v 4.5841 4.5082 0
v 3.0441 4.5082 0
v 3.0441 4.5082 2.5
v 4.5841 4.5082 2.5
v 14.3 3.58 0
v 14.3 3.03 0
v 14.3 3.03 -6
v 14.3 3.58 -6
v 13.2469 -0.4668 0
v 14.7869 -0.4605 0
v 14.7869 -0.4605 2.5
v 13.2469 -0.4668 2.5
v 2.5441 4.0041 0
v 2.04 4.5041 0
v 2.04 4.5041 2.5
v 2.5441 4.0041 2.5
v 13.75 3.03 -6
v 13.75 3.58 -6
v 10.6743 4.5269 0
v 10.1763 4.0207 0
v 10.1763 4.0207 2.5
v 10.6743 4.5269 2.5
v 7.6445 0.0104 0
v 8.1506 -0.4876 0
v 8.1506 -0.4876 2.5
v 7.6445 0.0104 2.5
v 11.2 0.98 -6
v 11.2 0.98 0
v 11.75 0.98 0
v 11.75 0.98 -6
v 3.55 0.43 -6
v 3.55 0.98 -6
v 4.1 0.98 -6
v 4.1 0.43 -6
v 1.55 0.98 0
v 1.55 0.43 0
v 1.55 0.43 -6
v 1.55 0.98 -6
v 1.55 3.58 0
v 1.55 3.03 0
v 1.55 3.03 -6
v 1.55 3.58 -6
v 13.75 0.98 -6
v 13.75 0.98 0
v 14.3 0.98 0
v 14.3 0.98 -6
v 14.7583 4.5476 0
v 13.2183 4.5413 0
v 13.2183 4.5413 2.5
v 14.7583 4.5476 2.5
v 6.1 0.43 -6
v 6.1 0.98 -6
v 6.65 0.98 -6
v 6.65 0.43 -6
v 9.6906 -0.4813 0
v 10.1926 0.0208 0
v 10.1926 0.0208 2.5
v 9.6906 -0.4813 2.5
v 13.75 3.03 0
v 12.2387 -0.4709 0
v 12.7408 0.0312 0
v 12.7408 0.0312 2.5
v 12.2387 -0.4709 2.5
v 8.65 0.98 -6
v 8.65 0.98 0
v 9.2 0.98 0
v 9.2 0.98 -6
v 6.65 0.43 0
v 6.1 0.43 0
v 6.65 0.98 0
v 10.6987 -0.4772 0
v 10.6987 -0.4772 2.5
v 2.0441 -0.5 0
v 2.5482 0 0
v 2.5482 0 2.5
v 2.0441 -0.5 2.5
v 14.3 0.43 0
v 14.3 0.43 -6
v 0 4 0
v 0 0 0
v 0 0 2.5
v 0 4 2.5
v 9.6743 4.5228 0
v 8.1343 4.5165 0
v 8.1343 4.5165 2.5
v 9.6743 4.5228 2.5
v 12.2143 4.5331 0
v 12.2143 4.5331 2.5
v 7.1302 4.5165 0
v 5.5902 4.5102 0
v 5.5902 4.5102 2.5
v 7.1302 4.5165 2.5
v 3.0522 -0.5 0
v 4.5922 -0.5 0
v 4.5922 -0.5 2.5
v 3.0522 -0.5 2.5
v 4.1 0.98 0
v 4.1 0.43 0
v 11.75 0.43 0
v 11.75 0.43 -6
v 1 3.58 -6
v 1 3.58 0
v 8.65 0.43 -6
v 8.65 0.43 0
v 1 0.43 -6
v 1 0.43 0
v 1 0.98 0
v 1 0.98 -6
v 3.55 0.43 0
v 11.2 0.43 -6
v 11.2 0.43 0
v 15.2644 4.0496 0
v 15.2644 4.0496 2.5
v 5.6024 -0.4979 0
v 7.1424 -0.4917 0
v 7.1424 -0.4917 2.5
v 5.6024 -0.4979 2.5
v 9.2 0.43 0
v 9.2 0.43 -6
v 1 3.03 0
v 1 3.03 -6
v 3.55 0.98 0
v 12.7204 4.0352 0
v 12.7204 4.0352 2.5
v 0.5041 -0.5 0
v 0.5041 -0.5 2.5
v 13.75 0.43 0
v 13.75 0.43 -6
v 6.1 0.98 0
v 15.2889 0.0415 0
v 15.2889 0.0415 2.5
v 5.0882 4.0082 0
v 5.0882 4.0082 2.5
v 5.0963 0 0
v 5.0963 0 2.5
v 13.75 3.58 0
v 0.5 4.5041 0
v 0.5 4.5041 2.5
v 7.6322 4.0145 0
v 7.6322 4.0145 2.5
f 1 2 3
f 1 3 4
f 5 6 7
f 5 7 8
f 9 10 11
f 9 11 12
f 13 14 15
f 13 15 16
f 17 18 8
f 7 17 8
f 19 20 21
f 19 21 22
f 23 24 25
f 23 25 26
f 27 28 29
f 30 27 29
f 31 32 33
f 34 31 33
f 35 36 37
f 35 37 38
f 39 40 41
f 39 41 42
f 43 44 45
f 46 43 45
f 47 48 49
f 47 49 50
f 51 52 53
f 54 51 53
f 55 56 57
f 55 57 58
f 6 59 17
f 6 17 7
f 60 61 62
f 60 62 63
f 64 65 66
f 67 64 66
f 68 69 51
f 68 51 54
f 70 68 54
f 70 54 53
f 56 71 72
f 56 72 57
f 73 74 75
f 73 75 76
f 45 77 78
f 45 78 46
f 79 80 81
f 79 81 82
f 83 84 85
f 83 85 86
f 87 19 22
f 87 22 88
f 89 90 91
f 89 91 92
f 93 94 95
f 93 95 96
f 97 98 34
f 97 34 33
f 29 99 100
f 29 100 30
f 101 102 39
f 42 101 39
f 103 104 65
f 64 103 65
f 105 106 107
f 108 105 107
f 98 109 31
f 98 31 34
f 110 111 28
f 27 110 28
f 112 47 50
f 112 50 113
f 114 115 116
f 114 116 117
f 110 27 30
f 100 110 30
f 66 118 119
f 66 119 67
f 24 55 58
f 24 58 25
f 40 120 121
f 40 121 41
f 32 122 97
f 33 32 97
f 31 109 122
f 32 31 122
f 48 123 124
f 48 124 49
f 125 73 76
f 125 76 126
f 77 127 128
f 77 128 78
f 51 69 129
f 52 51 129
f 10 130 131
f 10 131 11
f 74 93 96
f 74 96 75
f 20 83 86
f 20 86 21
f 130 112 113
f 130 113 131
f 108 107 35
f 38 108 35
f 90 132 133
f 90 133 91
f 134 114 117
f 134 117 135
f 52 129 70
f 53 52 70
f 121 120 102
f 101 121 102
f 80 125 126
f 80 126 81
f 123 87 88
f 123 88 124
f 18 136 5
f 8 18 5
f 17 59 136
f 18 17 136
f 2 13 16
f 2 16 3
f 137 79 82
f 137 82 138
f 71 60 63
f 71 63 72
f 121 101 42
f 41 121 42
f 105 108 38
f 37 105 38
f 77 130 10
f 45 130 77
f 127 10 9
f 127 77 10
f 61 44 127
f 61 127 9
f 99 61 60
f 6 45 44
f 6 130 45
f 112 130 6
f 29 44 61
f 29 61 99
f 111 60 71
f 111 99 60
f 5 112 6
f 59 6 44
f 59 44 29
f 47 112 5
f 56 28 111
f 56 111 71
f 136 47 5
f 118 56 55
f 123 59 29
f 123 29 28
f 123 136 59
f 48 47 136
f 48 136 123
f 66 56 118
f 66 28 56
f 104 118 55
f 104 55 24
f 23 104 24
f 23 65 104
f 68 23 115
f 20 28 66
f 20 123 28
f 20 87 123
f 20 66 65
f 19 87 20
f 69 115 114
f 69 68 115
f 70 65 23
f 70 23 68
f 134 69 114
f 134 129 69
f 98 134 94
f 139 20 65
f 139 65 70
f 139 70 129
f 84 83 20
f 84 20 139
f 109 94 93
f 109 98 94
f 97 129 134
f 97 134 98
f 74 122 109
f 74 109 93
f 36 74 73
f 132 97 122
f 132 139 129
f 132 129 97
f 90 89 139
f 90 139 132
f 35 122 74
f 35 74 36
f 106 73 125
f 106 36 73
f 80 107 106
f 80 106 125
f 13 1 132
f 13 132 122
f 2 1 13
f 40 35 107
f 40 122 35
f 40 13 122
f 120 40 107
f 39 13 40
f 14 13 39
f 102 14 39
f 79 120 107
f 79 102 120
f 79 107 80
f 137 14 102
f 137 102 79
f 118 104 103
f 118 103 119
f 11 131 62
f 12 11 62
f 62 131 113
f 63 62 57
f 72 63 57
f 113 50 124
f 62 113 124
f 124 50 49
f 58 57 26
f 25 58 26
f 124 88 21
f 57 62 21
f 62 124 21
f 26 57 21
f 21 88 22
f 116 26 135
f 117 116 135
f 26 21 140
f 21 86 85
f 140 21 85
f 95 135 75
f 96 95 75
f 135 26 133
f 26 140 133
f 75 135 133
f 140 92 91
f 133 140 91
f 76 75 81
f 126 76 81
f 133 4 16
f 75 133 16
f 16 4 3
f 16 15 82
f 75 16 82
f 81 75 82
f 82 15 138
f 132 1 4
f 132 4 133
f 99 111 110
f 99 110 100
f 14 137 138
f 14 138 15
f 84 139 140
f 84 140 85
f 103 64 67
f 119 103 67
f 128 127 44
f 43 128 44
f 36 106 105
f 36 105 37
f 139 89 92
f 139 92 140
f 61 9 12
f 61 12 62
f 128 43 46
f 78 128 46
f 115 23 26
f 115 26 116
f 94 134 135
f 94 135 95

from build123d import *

# Parameters (mm, degrees)
BOSS_EXTRUDE1_DEPTH = 2.5
SKETCH2_W           = 0.55
SKETCH2_H           = 0.55
BOSS_EXTRUDE2_DEPTH = 6


with BuildPart() as part:
    # Sketch1 → Boss-Extrude1 (new body)
    with BuildSketch(Plane.XY):
        Polygon((0, 0), (0, 4), (0.5, 4.504083326), (2.04, 4.504083326), (2.544083326, 4.004083326), (3.044083326, 4.508166653), (4.584083326, 4.508166653), (5.088166653, 4.008166653), (5.590208299, 4.510216636), (7.130195513, 4.51649212), (7.632245496, 4.014450474), (8.134287142, 4.516500457), (9.674274356, 4.522775941), (10.176324339, 4.020734295), (10.674266053, 4.526850931), (12.214253267, 4.533126415), (12.720369903, 4.035184701), (13.218311617, 4.541301337), (14.758298831, 4.547576821), (15.264415467, 4.049635107), (15.28891529, 0.041535012), (14.786873643, -0.460514971), (13.24688643, -0.466790455), (12.740769794, 0.031151259), (12.238728147, -0.470898724), (10.698740934, -0.477174208), (10.192624298, 0.020767506), (9.690582651, -0.481282477), (8.150595438, -0.487557961), (7.644478802, 0.010383753), (7.142437155, -0.49166623), (5.602449942, -0.497941714), (5.096333306, 0), (4.592249979, -0.5), (3.052249979, -0.5), (2.548166653, 0), (2.044083326, -0.5), (0.504083326, -0.5), align=None)
    extrude(amount=BOSS_EXTRUDE1_DEPTH)

    # Sketch2 → Boss-Extrude2 (add)
    with BuildSketch(Plane.XY):
        with Locations((6.375, 0.705)):
            Rectangle(SKETCH2_W, SKETCH2_H)
        with Locations((3.825, 0.705)):
            Rectangle(SKETCH2_W, SKETCH2_H)
        with Locations((14.025, 0.705)):
            Rectangle(SKETCH2_W, SKETCH2_H)
        with Locations((14.025, 3.305)):
            Rectangle(SKETCH2_W, SKETCH2_H)
        with Locations((8.925, 0.705)):
            Rectangle(SKETCH2_W, SKETCH2_H)
        with Locations((1.275, 0.705)):
            Rectangle(SKETCH2_W, SKETCH2_H)
        with Locations((11.475, 0.705)):
            Rectangle(SKETCH2_W, SKETCH2_H)
        with Locations((1.275, 3.305)):
            Rectangle(SKETCH2_W, SKETCH2_H)
    extrude(amount=-BOSS_EXTRUDE2_DEPTH)


solid = part.part
